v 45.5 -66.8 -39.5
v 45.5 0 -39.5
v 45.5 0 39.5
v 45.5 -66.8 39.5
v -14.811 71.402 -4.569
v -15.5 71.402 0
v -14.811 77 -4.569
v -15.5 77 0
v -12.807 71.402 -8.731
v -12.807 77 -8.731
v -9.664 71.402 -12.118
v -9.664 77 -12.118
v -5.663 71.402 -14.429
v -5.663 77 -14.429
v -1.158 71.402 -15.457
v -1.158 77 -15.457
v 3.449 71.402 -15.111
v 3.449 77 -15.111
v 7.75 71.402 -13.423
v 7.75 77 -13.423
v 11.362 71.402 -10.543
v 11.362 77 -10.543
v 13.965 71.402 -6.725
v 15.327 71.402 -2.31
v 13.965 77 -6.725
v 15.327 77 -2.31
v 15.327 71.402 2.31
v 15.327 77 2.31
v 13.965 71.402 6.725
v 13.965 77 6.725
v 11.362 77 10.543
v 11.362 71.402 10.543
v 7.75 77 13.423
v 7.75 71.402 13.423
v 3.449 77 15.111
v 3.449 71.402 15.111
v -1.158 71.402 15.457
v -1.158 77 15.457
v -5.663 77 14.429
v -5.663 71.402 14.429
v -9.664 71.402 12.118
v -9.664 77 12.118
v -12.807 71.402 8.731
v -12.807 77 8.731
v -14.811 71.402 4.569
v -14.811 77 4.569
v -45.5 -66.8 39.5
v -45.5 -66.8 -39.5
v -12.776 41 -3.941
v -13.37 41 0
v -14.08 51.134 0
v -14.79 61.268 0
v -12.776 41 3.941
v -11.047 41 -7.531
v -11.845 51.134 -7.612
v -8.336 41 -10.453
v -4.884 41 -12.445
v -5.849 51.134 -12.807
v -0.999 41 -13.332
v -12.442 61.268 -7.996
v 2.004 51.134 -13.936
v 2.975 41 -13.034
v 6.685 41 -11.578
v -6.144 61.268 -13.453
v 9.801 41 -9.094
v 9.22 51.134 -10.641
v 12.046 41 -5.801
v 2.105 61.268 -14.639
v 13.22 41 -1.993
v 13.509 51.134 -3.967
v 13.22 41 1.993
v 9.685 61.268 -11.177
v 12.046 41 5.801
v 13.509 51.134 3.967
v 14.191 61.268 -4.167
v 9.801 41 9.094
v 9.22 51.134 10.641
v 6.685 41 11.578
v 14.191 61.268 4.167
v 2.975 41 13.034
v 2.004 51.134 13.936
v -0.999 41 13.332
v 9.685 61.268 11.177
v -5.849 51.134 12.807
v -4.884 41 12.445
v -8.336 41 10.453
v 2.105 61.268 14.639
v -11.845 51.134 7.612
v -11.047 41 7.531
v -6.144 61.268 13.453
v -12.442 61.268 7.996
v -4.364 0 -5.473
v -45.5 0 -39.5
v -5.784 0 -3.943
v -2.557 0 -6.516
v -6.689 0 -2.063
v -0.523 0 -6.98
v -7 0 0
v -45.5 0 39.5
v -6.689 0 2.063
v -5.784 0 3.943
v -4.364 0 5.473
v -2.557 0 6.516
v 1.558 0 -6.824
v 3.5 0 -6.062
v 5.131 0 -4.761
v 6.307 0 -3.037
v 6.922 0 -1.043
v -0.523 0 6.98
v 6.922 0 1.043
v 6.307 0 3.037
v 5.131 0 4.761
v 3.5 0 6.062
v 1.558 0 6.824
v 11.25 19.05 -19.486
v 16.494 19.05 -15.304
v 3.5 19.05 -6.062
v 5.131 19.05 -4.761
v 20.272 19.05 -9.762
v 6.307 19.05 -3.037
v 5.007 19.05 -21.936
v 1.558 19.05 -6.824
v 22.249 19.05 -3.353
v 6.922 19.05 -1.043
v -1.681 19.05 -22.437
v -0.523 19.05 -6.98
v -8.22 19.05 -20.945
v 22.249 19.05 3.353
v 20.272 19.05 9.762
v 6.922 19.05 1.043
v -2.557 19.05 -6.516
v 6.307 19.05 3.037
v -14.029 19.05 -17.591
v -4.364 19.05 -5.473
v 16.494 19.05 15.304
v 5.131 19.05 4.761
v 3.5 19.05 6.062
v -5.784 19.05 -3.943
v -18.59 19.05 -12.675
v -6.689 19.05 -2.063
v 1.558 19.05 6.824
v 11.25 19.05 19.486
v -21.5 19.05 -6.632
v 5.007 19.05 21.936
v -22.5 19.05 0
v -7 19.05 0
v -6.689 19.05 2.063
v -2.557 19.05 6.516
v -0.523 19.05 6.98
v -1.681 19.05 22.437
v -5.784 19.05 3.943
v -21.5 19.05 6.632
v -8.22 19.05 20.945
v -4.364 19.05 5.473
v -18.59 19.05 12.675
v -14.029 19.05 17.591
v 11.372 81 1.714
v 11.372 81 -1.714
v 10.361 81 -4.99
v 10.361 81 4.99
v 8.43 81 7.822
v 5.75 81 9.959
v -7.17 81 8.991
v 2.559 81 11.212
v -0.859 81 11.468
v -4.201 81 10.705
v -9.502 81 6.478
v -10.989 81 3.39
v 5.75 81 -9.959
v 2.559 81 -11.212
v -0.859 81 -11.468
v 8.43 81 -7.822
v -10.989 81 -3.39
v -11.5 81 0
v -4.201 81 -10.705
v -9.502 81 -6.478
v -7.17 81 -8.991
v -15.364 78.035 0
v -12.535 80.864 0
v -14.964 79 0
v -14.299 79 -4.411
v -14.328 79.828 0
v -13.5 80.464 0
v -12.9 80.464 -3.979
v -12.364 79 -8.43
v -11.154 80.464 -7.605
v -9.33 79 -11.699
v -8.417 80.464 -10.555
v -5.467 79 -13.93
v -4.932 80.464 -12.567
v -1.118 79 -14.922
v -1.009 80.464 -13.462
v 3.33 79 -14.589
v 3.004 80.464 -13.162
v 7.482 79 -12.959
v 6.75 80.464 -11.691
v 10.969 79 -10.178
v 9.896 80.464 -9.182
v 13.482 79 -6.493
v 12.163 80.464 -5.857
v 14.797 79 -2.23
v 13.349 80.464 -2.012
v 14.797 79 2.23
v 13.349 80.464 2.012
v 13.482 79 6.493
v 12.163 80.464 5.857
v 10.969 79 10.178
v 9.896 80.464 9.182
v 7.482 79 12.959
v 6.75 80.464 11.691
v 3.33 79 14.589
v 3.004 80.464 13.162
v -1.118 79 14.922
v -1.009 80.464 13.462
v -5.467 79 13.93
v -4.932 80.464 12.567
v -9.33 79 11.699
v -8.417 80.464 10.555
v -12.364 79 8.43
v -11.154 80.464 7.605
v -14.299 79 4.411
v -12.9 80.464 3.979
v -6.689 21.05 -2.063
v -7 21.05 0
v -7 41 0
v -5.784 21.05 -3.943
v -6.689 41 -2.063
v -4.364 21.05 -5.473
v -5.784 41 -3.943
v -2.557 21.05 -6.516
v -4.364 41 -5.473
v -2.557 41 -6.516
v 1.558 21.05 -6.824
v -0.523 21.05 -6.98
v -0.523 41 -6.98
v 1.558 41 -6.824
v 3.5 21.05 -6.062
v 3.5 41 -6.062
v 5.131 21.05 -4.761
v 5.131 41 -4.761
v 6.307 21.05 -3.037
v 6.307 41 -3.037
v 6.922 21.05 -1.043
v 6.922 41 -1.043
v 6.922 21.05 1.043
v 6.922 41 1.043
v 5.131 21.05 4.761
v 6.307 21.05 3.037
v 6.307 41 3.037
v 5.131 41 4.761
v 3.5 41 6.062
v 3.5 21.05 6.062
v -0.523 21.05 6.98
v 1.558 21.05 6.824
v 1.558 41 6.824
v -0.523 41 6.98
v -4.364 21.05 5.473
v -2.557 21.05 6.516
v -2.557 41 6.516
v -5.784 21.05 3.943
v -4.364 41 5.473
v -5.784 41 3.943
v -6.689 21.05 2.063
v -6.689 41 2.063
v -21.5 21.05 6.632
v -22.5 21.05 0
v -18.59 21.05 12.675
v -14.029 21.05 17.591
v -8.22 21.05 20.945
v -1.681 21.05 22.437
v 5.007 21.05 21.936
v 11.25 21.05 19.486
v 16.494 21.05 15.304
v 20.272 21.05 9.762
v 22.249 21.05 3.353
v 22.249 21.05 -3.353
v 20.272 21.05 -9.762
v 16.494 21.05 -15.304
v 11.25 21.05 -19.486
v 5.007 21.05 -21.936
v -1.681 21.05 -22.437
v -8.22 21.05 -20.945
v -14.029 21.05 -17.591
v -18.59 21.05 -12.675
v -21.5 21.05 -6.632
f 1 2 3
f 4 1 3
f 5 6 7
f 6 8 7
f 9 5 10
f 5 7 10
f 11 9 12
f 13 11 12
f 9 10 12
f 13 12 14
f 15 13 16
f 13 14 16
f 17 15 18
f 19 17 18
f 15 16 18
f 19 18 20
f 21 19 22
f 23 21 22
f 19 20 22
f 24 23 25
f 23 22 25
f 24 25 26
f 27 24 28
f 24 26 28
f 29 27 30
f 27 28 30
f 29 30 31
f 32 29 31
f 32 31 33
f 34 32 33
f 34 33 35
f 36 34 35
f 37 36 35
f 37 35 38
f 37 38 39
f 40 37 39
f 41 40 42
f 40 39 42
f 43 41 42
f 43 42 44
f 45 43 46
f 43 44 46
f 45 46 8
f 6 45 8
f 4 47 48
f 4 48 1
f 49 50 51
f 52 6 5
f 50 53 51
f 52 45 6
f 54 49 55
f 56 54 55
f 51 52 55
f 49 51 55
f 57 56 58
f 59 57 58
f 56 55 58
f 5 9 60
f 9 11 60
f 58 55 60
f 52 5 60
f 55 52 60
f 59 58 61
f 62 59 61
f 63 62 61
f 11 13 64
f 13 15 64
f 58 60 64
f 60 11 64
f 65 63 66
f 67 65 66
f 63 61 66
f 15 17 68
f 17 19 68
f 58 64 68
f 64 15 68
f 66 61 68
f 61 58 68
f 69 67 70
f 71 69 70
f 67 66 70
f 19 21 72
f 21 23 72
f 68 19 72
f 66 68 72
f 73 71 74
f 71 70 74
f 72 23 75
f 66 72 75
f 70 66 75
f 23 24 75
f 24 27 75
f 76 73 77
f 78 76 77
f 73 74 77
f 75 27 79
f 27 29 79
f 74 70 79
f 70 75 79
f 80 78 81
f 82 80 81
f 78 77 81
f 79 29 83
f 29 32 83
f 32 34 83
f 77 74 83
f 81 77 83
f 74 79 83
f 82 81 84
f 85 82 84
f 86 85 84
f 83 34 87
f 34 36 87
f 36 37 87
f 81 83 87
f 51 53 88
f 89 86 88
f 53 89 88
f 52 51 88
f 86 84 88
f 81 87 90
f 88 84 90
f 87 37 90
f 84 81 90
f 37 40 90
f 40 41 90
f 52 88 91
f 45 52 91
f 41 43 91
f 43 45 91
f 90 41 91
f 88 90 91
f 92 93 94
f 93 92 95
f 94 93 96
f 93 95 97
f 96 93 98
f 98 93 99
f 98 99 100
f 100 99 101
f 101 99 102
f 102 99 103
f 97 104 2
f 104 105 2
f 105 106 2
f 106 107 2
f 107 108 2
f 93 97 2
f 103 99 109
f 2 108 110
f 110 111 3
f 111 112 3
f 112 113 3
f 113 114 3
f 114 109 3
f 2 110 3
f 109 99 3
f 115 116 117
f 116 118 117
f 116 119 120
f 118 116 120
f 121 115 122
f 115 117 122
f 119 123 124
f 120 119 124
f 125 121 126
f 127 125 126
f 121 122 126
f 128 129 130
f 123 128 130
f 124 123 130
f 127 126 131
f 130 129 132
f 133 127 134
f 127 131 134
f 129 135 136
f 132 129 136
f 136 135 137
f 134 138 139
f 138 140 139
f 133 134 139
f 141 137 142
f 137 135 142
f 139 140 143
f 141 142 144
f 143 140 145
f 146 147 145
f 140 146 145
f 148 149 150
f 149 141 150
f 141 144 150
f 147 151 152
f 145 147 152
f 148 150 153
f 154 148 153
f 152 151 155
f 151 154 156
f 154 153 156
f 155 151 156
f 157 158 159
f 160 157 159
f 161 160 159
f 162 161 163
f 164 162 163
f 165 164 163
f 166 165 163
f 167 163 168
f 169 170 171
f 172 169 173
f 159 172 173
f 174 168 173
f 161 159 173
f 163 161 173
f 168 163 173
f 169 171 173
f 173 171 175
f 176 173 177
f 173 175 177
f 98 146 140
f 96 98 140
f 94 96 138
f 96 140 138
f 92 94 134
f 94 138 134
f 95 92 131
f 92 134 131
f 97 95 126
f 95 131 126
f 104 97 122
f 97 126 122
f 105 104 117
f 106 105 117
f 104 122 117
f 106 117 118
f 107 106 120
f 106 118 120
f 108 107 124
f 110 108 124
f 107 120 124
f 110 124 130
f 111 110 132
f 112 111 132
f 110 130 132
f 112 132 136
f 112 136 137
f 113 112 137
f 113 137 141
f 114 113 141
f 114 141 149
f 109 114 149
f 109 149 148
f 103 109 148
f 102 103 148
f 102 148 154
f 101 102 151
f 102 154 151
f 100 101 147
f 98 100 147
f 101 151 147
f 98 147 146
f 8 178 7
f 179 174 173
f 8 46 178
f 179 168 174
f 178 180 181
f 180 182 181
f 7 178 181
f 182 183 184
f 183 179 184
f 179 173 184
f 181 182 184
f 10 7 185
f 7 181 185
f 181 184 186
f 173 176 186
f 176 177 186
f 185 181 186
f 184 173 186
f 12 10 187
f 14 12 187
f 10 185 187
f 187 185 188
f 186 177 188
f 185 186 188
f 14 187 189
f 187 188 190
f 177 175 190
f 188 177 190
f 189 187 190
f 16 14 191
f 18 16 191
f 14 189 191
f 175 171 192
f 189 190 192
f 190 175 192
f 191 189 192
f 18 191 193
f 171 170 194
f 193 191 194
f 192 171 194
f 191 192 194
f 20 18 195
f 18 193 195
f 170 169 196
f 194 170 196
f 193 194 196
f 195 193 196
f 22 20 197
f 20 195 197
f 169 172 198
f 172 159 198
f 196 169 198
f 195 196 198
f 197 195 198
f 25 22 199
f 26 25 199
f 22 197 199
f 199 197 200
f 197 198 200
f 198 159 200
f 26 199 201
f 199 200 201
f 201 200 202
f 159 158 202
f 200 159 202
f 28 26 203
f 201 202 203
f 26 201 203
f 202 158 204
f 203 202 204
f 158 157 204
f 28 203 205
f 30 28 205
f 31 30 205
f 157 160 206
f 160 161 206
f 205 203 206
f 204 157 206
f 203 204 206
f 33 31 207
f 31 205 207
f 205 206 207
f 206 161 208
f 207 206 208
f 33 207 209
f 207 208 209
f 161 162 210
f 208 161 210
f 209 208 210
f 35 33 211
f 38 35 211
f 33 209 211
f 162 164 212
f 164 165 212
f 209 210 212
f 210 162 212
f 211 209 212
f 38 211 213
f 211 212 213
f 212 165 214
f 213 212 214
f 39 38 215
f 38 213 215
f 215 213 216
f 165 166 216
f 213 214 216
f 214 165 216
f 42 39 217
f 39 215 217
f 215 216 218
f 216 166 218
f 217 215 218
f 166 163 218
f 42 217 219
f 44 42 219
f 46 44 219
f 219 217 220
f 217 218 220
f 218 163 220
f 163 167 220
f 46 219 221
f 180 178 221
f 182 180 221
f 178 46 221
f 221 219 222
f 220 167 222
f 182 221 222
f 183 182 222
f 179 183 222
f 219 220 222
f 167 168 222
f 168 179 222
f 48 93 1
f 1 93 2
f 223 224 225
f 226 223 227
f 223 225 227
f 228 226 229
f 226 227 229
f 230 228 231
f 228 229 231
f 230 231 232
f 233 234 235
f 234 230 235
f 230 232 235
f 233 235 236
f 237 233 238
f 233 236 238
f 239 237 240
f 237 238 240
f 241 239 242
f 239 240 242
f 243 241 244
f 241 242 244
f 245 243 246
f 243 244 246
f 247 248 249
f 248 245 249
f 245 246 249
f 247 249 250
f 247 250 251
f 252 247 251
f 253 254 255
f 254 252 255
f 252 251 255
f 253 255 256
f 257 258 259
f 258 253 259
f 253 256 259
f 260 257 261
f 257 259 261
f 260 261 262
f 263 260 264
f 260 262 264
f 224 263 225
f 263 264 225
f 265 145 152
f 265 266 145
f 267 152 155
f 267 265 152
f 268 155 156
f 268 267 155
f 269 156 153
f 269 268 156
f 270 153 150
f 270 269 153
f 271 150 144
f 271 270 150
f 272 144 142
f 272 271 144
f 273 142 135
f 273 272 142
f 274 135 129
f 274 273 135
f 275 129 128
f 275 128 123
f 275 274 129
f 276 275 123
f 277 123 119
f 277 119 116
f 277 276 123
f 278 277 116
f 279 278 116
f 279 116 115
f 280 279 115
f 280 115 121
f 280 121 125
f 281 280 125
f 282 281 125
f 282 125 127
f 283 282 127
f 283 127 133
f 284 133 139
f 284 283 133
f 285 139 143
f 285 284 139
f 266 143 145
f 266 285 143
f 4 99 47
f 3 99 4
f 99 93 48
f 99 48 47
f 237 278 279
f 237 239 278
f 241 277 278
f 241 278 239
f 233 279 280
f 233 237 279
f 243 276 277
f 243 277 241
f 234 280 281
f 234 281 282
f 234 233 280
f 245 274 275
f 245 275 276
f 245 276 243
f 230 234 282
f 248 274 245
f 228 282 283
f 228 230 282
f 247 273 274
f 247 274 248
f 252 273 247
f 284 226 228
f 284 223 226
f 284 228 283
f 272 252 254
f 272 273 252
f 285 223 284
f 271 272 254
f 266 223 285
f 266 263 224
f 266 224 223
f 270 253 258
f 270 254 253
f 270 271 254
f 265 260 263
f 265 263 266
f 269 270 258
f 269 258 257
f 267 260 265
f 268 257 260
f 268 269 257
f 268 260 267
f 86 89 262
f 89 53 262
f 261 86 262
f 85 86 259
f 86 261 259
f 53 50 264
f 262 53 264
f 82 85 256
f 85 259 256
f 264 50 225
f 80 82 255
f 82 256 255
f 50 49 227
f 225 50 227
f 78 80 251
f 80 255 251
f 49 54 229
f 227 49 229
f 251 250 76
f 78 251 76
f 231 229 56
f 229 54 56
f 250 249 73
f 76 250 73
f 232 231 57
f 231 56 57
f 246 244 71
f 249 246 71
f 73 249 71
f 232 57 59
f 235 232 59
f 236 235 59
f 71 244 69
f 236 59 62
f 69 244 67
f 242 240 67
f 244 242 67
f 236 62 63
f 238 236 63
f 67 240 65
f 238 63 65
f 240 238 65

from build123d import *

# Parameters (mm, degrees)
SKETCH2_W           = 15.5
SKETCH2_H           = 2
SKETCH3_W           = 91
SKETCH3_H           = 79
BOSS_EXTRUDE1_DEPTH = 66.8


with BuildPart() as part:
    # Sketch1 → Revolve1 (revolve)
    with BuildSketch(Plane.XY):
        with BuildLine():
            Line((0, 0), (-7, 0))
            Line((-7, 0), (-7, 41))
            Line((-7, 41), (-13.369653316, 41))
            Line((-13.369653316, 41), (-15.5, 71.401844965))
            Line((-15.5, 71.401844965), (-15.5, 77))
            ThreePointArc((-15.5, 77), (-14.328427125, 79.828427125), (-11.5, 81))
            Line((-11.5, 81), (0, 81))
            Line((0, 81), (0, 0))
        make_face()
    revolve(axis=Axis((0, 0, 0), (0, -1, 0)))

    # Sketch2 → Revolve2 (revolve)
    with BuildSketch(Plane.XY):
        with Locations((-14.75, 20.05)):
            Rectangle(SKETCH2_W, SKETCH2_H)
    revolve(axis=Axis((0, 0, 0), (0, 1, 0)))

    # Sketch3 → Boss-Extrude1 (add)
    with BuildSketch(Plane.XZ):
        Rectangle(SKETCH3_W, SKETCH3_H)
    extrude(amount=BOSS_EXTRUDE1_DEPTH)


solid = part.part
